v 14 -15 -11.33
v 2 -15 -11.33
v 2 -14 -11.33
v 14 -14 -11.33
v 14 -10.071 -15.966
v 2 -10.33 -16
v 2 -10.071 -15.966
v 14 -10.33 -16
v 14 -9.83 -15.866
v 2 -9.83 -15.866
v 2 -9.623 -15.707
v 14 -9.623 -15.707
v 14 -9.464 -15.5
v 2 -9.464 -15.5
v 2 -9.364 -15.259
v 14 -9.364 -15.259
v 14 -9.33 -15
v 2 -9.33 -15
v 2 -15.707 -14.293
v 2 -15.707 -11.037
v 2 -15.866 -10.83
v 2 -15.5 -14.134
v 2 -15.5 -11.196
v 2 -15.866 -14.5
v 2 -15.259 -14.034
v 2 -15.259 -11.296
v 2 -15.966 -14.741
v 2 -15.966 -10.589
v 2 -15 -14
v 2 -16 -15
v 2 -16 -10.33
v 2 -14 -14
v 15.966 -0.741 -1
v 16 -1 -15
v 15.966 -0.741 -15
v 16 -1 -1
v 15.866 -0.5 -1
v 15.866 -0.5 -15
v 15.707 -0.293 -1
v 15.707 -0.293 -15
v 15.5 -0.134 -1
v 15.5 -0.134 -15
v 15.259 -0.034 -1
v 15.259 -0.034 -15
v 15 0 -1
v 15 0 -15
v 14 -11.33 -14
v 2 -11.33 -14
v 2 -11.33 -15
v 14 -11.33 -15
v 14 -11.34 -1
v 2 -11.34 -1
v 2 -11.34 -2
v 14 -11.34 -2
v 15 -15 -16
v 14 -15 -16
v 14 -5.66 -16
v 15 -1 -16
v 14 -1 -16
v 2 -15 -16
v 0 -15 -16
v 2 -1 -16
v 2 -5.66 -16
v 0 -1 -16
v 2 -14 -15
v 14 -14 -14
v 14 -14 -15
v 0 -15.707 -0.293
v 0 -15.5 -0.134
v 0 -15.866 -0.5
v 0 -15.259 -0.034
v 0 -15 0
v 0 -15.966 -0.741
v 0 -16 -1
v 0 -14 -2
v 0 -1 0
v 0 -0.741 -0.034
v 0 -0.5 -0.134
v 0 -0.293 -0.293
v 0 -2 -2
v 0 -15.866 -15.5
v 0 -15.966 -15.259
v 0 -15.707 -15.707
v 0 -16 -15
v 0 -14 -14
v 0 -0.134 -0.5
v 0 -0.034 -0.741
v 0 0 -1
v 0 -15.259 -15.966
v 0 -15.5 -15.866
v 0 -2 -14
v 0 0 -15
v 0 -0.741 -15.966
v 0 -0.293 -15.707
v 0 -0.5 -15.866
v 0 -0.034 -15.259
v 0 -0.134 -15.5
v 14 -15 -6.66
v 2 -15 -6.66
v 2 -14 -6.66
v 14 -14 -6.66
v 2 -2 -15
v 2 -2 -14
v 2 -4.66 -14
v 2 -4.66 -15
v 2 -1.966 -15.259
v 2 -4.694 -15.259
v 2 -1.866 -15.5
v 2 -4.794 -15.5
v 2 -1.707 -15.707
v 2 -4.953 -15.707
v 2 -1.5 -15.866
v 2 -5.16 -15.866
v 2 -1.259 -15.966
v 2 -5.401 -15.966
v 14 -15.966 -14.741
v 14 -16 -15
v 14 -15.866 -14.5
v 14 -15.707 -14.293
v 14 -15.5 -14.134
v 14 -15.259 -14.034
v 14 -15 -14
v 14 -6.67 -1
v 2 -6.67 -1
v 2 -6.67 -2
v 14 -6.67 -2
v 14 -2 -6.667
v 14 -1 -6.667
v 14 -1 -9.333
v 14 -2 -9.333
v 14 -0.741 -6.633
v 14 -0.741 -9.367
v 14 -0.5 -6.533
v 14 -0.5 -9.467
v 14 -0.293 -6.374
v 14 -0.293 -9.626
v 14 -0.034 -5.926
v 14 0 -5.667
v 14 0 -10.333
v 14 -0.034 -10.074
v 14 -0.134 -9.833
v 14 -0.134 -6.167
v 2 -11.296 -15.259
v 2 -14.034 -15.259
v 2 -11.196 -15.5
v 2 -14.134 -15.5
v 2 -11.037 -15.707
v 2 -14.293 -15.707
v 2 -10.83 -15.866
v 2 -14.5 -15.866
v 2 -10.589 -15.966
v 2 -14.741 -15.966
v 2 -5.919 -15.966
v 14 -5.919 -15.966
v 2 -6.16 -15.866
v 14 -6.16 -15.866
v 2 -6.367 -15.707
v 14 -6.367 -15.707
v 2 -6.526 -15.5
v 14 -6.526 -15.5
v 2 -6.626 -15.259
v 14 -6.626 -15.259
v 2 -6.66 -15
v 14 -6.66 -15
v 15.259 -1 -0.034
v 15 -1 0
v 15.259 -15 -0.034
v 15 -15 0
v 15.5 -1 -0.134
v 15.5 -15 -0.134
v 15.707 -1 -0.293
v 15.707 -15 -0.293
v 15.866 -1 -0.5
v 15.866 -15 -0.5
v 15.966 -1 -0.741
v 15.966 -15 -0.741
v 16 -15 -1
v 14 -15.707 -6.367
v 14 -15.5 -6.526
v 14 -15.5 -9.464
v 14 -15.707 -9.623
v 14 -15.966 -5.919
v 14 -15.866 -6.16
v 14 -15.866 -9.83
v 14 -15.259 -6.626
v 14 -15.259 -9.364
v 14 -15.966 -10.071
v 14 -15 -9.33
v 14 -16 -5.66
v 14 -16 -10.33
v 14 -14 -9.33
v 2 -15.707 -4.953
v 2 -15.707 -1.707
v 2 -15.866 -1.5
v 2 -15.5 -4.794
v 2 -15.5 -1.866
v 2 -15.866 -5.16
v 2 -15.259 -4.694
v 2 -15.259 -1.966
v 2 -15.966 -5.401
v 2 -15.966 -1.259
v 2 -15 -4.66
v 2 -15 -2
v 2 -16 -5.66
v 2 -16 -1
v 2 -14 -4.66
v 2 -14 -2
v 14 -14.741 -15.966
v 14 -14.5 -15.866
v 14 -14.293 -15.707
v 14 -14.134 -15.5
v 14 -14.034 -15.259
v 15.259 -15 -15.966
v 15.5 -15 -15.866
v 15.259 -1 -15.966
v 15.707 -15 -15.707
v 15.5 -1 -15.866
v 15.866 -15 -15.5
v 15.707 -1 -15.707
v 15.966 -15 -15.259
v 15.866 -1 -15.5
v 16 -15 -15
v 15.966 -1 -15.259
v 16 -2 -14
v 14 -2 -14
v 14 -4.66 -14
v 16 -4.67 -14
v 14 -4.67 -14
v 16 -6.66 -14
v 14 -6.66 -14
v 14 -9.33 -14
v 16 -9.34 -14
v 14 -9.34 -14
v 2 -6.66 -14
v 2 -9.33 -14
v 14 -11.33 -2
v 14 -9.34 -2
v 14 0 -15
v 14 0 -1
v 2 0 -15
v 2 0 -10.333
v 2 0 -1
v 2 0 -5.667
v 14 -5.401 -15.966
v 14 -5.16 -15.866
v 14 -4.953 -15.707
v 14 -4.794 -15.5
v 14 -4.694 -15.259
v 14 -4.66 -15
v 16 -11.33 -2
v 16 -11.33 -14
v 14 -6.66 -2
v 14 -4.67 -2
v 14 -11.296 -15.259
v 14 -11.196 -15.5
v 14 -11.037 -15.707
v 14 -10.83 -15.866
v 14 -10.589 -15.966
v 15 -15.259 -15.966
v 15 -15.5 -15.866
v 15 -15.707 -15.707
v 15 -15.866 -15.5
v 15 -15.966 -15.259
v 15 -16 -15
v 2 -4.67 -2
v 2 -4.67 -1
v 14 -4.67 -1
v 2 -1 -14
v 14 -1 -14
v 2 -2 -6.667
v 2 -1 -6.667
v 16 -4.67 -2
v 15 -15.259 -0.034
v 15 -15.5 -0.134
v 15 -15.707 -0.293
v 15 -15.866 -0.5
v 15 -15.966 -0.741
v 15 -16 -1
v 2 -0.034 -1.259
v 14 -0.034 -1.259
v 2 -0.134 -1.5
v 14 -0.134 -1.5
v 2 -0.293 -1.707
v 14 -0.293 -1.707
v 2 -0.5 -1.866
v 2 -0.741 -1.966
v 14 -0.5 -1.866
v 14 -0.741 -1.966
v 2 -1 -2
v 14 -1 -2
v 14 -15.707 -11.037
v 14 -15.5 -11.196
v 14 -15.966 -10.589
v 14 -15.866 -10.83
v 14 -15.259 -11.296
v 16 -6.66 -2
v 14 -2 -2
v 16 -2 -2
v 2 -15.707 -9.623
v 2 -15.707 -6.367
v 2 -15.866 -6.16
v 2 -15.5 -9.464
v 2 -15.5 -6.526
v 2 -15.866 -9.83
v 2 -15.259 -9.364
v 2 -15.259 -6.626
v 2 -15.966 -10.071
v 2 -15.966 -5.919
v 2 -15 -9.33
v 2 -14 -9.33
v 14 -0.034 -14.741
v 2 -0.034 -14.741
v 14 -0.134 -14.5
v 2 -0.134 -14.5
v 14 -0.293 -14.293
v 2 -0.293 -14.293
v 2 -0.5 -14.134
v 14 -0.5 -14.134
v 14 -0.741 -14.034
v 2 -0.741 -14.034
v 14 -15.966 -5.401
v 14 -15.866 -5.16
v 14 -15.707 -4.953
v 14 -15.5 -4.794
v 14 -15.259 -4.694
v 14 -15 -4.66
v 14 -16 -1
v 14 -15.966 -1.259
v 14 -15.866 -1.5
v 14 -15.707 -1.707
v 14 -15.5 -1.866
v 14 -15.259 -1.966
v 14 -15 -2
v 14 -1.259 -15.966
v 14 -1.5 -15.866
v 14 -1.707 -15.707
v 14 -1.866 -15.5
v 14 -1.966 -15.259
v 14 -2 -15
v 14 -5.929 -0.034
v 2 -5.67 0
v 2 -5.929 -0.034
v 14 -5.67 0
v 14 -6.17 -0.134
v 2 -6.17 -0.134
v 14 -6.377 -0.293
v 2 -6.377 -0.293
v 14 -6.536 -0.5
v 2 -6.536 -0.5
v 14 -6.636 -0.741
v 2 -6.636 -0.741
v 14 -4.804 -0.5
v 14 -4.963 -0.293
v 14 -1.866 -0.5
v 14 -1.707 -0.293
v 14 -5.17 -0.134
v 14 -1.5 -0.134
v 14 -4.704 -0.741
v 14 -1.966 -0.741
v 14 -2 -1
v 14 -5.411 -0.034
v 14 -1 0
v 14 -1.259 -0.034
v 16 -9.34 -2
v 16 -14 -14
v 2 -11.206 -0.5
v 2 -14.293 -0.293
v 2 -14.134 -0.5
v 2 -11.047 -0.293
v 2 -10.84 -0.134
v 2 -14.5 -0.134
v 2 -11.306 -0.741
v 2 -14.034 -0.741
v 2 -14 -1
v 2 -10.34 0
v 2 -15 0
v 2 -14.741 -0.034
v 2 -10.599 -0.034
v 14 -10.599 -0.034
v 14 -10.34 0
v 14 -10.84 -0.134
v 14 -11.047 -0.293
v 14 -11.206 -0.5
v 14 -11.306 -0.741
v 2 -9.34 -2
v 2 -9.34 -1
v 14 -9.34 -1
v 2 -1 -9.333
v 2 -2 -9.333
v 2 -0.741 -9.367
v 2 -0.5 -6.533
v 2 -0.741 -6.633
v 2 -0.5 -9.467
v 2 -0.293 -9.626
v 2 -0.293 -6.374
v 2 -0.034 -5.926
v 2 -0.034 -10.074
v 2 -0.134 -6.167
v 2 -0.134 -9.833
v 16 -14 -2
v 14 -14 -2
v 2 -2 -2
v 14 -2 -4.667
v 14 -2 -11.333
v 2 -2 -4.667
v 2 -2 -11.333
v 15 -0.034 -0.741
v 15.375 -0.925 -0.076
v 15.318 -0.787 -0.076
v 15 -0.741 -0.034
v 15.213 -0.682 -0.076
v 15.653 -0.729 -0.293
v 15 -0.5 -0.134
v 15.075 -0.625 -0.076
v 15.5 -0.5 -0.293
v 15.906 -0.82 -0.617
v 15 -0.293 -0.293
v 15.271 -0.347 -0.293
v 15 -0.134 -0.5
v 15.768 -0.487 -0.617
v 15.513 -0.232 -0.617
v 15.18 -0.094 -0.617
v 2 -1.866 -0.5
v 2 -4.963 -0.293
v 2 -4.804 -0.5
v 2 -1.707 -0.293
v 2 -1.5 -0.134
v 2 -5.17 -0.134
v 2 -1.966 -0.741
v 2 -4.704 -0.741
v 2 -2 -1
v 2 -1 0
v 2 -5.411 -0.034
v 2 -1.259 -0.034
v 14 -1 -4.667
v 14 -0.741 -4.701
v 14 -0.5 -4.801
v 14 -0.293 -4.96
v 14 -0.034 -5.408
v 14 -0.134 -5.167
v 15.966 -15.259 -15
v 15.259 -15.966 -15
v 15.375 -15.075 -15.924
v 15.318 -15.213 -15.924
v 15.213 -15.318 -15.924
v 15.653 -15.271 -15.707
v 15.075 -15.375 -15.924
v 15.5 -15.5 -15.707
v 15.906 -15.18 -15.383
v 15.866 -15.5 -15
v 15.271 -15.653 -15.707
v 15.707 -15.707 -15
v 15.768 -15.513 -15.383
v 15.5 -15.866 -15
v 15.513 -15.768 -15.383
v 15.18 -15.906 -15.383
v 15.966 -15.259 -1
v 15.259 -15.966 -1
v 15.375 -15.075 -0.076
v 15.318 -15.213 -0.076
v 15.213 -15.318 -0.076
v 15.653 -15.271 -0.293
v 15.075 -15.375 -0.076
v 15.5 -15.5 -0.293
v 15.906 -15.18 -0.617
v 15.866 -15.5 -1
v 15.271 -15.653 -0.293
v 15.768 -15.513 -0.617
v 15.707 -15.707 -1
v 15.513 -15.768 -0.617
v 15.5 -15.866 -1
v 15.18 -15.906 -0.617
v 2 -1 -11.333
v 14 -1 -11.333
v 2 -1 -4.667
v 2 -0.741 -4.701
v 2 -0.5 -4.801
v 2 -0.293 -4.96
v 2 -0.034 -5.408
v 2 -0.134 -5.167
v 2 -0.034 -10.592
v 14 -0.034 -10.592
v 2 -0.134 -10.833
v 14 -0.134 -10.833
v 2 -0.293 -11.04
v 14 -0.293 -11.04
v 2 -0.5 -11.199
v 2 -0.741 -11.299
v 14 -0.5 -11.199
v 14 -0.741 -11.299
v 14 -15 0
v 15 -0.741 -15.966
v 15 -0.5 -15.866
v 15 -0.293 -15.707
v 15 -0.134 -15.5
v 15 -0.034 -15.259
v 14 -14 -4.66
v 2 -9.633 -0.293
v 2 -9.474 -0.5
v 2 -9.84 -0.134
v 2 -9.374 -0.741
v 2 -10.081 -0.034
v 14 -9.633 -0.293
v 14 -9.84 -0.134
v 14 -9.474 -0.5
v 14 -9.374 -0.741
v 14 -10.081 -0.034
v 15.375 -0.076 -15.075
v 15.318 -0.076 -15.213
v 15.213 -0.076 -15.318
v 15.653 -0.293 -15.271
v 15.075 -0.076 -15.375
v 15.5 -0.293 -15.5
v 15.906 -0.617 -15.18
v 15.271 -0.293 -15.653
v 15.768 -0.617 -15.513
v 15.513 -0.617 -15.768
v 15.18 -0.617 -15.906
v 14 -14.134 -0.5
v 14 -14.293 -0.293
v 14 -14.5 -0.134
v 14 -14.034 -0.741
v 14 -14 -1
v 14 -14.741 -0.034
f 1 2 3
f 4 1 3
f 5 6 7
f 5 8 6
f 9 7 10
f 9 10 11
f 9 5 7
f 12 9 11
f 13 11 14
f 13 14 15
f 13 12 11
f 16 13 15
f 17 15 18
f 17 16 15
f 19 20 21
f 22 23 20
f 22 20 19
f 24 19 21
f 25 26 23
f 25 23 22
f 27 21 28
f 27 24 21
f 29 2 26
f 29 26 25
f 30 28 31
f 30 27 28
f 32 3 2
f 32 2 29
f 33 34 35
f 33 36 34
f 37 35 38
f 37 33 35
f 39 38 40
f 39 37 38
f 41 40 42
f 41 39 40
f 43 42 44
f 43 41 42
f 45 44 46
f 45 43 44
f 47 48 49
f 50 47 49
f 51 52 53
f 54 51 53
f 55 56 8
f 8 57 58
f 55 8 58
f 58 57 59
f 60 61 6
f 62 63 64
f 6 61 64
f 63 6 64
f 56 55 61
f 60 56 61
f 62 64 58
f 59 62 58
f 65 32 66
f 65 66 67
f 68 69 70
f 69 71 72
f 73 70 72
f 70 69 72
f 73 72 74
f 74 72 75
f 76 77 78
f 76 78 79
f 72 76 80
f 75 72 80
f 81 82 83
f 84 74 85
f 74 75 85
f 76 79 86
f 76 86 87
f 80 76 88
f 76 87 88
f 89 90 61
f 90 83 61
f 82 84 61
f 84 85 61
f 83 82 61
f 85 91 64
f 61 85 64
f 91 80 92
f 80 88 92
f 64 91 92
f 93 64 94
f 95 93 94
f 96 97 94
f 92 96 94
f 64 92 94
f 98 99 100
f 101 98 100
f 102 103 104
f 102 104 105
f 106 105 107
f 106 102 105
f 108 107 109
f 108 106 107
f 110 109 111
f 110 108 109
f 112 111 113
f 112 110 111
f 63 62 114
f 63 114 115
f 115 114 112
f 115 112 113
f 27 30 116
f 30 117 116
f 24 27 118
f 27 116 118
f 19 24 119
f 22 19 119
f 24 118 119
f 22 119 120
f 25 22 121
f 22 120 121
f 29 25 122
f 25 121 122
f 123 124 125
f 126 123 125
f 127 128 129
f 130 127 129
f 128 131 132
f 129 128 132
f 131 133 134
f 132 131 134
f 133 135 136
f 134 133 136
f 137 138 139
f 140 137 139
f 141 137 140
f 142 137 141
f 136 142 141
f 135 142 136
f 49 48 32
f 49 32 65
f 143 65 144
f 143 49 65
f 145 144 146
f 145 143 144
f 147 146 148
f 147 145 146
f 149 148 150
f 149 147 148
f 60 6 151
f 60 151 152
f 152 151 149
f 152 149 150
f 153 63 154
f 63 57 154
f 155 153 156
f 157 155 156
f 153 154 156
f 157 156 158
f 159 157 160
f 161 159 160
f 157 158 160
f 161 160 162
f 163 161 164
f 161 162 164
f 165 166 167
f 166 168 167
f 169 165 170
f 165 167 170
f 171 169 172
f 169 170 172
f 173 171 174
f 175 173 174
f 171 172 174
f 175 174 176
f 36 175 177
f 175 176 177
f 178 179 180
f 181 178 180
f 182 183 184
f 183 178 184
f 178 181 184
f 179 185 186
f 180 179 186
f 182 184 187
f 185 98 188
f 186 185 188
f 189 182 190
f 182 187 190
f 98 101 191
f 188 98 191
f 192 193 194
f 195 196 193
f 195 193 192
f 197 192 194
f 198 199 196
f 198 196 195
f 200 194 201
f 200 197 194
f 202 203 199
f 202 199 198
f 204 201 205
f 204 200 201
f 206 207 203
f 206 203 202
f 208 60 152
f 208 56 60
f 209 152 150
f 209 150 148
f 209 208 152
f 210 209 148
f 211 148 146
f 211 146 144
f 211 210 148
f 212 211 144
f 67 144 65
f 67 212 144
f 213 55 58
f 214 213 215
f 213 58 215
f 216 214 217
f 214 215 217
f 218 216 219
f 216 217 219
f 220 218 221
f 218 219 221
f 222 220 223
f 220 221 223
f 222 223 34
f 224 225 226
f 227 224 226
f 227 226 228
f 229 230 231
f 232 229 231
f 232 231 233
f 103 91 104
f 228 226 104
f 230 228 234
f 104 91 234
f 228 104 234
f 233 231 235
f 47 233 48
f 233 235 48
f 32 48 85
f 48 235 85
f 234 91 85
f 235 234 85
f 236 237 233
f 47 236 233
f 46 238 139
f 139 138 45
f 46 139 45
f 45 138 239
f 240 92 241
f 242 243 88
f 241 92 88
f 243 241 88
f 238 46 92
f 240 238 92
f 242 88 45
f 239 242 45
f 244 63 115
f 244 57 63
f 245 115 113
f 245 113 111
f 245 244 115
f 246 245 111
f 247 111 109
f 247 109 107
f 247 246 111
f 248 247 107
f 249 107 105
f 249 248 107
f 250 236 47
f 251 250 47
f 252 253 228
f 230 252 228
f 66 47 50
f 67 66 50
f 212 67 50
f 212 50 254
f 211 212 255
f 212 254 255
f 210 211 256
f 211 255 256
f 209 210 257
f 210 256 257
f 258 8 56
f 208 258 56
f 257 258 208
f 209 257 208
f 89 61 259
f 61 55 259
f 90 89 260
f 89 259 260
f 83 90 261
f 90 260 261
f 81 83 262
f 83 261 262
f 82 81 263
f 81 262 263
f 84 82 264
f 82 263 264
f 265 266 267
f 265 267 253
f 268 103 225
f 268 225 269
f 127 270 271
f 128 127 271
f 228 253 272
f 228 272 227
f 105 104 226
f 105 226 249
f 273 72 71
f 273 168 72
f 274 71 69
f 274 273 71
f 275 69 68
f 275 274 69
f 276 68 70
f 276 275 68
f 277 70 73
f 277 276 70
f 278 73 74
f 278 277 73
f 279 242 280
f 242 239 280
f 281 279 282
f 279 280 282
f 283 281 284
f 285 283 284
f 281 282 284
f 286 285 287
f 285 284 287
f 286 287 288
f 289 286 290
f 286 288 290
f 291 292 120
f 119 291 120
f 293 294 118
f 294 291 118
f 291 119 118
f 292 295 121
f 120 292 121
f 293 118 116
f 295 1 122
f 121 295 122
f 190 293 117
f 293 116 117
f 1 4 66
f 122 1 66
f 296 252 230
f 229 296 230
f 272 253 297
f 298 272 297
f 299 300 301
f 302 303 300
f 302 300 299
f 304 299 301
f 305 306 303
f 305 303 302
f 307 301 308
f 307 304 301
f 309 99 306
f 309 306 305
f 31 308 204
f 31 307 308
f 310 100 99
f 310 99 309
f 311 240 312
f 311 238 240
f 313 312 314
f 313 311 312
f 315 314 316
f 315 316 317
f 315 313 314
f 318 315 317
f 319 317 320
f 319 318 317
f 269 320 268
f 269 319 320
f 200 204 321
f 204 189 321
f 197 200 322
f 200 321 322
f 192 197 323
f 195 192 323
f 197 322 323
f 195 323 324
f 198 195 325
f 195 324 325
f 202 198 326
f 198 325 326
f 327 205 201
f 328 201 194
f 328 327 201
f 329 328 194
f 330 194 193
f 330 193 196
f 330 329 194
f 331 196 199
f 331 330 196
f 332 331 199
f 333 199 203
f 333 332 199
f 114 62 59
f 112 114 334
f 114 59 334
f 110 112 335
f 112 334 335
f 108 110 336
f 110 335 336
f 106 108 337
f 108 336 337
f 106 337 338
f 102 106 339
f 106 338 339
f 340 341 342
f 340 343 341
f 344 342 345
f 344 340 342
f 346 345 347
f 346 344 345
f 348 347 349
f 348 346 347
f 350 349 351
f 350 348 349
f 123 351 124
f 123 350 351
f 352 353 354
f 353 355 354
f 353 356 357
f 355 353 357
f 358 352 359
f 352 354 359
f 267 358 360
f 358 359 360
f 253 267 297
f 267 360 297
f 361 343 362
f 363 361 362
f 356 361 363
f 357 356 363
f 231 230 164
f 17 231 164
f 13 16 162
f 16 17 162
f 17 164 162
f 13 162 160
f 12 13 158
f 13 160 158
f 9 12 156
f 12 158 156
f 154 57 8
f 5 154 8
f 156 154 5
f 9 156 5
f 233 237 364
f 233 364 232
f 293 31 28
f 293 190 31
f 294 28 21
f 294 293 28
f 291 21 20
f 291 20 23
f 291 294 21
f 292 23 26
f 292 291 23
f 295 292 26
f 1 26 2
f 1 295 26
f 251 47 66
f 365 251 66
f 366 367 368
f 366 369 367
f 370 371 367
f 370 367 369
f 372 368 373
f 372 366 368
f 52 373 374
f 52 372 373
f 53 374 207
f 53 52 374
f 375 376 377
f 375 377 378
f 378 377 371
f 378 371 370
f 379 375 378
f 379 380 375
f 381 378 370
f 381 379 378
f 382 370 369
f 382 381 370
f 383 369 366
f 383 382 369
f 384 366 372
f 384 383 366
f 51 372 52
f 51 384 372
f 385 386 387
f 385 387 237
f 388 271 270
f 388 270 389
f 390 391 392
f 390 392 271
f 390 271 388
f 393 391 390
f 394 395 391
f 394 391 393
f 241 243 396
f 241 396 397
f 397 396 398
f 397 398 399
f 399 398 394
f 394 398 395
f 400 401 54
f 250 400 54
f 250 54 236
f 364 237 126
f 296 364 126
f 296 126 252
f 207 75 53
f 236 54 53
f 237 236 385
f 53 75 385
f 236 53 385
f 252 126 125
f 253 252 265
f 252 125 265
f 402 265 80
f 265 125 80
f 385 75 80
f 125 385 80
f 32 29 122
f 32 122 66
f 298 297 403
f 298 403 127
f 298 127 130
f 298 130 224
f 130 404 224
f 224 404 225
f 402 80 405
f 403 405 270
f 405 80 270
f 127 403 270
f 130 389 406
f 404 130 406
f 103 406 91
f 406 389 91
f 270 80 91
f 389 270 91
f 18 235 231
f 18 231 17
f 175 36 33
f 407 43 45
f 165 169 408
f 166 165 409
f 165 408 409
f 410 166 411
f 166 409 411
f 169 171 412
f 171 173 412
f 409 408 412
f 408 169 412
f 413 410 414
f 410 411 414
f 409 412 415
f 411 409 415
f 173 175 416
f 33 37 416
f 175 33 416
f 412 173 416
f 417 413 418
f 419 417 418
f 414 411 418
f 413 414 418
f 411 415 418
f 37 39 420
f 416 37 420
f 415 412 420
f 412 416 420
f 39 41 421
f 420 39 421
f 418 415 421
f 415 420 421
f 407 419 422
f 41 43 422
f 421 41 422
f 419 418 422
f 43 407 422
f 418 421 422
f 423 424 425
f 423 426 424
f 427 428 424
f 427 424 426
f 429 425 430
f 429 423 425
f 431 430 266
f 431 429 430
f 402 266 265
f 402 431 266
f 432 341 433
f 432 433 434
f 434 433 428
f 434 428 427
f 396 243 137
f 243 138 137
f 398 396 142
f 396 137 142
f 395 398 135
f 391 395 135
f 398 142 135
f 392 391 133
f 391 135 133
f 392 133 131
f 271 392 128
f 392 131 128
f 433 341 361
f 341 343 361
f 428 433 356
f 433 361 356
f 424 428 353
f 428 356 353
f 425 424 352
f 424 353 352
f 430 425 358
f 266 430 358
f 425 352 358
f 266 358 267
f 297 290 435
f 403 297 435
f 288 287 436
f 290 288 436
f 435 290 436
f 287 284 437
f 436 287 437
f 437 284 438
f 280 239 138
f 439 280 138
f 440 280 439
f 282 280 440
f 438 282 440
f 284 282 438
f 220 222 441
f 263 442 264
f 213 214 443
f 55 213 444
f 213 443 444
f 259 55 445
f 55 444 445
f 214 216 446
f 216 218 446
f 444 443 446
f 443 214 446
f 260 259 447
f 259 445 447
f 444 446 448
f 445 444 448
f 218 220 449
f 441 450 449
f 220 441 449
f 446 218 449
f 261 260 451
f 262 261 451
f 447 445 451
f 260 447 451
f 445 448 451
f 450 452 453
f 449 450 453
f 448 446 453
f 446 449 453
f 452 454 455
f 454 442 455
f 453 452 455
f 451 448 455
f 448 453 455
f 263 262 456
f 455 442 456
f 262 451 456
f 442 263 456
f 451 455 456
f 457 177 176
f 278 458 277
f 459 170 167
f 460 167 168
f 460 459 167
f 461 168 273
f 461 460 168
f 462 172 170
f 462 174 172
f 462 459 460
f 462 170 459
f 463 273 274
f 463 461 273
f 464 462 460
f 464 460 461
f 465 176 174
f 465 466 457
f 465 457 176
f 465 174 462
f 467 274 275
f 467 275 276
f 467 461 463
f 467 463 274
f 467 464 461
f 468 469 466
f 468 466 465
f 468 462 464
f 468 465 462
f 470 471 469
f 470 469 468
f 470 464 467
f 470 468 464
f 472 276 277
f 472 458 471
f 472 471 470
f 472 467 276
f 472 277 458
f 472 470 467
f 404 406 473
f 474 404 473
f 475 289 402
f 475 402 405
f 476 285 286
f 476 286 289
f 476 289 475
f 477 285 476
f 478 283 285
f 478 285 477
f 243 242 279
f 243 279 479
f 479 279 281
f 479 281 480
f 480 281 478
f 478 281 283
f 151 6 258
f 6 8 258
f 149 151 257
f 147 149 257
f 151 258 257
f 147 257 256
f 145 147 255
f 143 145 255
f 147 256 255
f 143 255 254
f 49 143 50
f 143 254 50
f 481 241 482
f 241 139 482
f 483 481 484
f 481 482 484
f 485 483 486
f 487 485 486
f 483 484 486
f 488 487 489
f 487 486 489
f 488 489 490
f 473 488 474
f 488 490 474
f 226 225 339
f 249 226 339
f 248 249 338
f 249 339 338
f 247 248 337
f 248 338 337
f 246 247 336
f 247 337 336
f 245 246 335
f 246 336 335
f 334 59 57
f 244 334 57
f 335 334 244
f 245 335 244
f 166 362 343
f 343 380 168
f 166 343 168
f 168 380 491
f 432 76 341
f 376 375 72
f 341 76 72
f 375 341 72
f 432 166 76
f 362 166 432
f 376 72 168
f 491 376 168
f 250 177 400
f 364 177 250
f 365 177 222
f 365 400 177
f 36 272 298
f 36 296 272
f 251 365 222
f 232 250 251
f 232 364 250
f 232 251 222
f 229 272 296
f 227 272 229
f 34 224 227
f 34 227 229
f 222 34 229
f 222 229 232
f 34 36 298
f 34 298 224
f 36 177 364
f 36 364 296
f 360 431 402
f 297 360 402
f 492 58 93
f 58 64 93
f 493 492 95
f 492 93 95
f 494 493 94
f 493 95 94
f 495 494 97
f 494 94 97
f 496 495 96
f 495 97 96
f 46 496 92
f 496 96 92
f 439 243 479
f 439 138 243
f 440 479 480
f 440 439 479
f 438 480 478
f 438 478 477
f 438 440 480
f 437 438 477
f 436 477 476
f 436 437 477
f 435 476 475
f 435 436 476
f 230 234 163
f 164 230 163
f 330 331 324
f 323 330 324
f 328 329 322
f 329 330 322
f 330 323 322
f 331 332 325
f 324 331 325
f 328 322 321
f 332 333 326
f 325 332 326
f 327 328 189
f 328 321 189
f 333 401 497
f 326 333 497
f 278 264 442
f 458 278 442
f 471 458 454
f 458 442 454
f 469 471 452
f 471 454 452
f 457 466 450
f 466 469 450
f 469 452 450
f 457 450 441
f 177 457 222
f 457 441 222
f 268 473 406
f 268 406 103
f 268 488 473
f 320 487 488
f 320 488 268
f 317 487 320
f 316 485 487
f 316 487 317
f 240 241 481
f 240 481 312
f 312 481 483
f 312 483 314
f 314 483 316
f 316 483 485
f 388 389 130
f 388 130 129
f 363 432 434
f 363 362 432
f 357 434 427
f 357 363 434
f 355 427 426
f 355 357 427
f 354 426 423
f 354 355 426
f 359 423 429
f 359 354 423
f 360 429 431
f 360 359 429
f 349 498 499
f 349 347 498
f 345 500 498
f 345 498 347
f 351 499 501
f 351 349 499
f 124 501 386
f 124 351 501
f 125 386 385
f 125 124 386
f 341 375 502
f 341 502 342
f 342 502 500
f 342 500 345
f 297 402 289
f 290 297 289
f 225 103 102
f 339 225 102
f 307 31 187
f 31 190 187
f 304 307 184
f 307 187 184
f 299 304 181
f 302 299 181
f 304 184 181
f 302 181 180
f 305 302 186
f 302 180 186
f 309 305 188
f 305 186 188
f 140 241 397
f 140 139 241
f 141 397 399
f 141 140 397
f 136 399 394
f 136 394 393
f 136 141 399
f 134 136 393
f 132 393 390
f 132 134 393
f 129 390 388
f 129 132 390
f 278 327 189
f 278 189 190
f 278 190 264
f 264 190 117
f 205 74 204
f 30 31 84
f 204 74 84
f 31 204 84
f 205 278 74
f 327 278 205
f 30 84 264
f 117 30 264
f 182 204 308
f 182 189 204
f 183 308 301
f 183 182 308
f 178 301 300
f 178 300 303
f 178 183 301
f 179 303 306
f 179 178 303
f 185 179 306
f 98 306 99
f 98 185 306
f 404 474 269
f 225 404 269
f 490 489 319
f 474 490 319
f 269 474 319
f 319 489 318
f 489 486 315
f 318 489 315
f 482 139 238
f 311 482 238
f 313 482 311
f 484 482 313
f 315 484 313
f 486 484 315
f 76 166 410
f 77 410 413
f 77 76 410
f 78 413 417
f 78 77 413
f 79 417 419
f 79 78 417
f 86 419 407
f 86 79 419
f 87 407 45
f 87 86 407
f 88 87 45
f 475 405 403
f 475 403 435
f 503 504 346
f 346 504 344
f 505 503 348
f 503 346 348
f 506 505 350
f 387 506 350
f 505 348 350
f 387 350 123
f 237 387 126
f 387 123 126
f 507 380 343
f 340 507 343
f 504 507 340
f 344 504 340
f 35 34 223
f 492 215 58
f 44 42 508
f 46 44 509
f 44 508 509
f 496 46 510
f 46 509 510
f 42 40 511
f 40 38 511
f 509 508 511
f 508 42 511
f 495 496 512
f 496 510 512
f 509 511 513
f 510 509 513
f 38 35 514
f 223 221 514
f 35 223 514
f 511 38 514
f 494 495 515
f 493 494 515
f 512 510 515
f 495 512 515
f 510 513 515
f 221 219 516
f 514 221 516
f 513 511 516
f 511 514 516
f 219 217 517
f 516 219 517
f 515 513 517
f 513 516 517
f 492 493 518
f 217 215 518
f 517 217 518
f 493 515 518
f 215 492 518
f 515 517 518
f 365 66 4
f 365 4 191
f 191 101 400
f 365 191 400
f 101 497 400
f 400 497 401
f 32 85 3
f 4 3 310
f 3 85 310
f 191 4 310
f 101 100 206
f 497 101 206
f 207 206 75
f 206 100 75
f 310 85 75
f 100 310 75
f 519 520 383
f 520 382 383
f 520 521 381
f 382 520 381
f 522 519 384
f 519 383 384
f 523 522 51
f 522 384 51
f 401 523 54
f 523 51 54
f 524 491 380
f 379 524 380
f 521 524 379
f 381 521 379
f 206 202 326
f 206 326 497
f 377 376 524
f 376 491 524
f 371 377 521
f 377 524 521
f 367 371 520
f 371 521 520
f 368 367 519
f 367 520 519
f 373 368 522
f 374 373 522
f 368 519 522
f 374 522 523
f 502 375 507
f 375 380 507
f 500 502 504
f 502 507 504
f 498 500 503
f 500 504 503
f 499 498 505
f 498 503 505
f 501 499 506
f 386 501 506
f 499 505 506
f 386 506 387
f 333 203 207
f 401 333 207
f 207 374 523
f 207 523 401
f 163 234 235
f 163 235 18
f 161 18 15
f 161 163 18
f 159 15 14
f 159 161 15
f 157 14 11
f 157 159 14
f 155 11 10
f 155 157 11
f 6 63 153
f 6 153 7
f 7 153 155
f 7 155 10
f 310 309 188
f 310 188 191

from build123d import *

# Parameters (mm, degrees)
SKETCH_1_W      = 16
SKETCH_1_H      = 16
SKETCH_1_W_2    = 12
SKETCH_1_H_2    = 12
EXTRUDE_1_DEPTH = 2
SKETCH_2_W      = 2
SKETCH_2_H      = 2
EXTRUDE_2_DEPTH = 12
SKETCH_3_W      = 2
SKETCH_3_H      = 2
SKETCH_3_W_2    = 12
SKETCH_3_H_2    = 1.99
EXTRUDE_3_DEPTH = 2
FILLET_1_R      = 1
FILLET_2_R      = 1


with BuildPart() as part:
    # 草图1 → 凸台-拉伸1 (new body)
    with BuildSketch(Plane(origin=(0, 0, 0), x_dir=(0, 0, -1), z_dir=(1, 0, 0))):
        with Locations((8, -8)):
            Rectangle(SKETCH_1_W, SKETCH_1_H)
        with Locations((8, -8)):
            Rectangle(SKETCH_1_W_2, SKETCH_1_H_2, mode=Mode.SUBTRACT)
    extrude(amount=EXTRUDE_1_DEPTH)

    # 草图2 → 凸台-拉伸2 (add)
    with BuildSketch(Plane(origin=(2, 0, 0), x_dir=(0, 0, -1), z_dir=(1, 0, 0))):
        with Locations((5.666666, -1)):
            Rectangle(SKETCH_2_W, SKETCH_2_H)
        with Locations((1, -1)):
            Rectangle(SKETCH_2_W, SKETCH_2_H)
        with Locations((10.333332, -1)):
            Rectangle(SKETCH_2_W, SKETCH_2_H)
        with Locations((15, -1)):
            Rectangle(SKETCH_2_W, SKETCH_2_H)
        with Locations((1, -5.67)):
            Rectangle(SKETCH_2_W, SKETCH_2_H)
        with Locations((1, -10.34)):
            Rectangle(SKETCH_2_W, SKETCH_2_H)
        with Locations((1, -15)):
            Rectangle(SKETCH_2_W, SKETCH_2_H)
        with Locations((10.33, -15)):
            Rectangle(SKETCH_2_W, SKETCH_2_H)
        with Locations((15, -15)):
            Rectangle(SKETCH_2_W, SKETCH_2_H)
        with Locations((5.66, -15)):
            Rectangle(SKETCH_2_W, SKETCH_2_H)
        with Locations((15, -10.33)):
            Rectangle(SKETCH_2_W, SKETCH_2_H)
        with Locations((15, -5.66)):
            Rectangle(SKETCH_2_W, SKETCH_2_H)
    extrude(amount=EXTRUDE_2_DEPTH)

    # 草图3 → 凸台-拉伸3 (add)
    with BuildSketch(Plane(origin=(14, 0, 0), x_dir=(0, 0, -1), z_dir=(1, 0, 0))):
        with Locations((1, -1)):
            Rectangle(SKETCH_3_W, SKETCH_3_H)
        Polygon((2, -2), (0, -2), (0, -16), (2, -16), (2, -14), (2, -11.33), (2, -9.34), (2, -6.66), (2, -4.67), align=None)
        Polygon((2, -14), (2, -16), (16, -16), (16, -14), (14, -14), align=None)
        Polygon((16, 0), (14, 0), (14, -2), (14, -4.67), (14, -6.66), (14, -9.34), (14, -11.33), (14, -14), (16, -14), align=None)
        with Locations((8, -1)):
            Rectangle(SKETCH_3_W_2, SKETCH_3_H)
        with Locations((8, -5.665)):
            Rectangle(SKETCH_3_W_2, SKETCH_3_H_2)
        with Locations((8, -10.335)):
            Rectangle(SKETCH_3_W_2, SKETCH_3_H_2)
    extrude(amount=EXTRUDE_3_DEPTH)

    # 圆角1
    fillet_1_edges = [part.edges().sort_by_distance(p)[0] for p in [
        (16, -16, -8),
        (16, -8, -16),
        (16, 0, -8),
        (16, -8, 0),
        (8, 0, 0),
        (8, 0, -16),
        (8, -16, -16),
        (8, -16, 0),
    ]]
    fillet(fillet_1_edges, radius=FILLET_1_R)

    # 圆角2
    fillet_2_edges = [part.edges().sort_by_distance(p)[0] for p in [
        (8, -16, -2),
        (8, -14, 0),
        (8, -16, -9.33),
        (8, -16, -11.33),
        (8, -16, -4.66),
        (8, -16, -6.66),
        (8, -11.33, -16),
        (8, -9.33, -16),
        (8, -6.66, -16),
        (8, -4.66, -16),
        (8, -2, 0),
        (8, 0, -2),
        (8, -14, -16),
        (8, -16, -14),
        (8, 0, -6.666666),
        (8, 0, -4.666666),
        (8, 0, -11.333332),
        (8, 0, -9.333332),
        (8, 0, -14),
        (8, -2, -16),
        (8, -4.67, 0),
        (8, -6.67, 0),
        (8, -9.34, 0),
        (8, -11.34, 0),
    ]]
    fillet(fillet_2_edges, radius=FILLET_2_R - 0.0001)  # a hair under: the kernel refuses the full size


solid = part.part
